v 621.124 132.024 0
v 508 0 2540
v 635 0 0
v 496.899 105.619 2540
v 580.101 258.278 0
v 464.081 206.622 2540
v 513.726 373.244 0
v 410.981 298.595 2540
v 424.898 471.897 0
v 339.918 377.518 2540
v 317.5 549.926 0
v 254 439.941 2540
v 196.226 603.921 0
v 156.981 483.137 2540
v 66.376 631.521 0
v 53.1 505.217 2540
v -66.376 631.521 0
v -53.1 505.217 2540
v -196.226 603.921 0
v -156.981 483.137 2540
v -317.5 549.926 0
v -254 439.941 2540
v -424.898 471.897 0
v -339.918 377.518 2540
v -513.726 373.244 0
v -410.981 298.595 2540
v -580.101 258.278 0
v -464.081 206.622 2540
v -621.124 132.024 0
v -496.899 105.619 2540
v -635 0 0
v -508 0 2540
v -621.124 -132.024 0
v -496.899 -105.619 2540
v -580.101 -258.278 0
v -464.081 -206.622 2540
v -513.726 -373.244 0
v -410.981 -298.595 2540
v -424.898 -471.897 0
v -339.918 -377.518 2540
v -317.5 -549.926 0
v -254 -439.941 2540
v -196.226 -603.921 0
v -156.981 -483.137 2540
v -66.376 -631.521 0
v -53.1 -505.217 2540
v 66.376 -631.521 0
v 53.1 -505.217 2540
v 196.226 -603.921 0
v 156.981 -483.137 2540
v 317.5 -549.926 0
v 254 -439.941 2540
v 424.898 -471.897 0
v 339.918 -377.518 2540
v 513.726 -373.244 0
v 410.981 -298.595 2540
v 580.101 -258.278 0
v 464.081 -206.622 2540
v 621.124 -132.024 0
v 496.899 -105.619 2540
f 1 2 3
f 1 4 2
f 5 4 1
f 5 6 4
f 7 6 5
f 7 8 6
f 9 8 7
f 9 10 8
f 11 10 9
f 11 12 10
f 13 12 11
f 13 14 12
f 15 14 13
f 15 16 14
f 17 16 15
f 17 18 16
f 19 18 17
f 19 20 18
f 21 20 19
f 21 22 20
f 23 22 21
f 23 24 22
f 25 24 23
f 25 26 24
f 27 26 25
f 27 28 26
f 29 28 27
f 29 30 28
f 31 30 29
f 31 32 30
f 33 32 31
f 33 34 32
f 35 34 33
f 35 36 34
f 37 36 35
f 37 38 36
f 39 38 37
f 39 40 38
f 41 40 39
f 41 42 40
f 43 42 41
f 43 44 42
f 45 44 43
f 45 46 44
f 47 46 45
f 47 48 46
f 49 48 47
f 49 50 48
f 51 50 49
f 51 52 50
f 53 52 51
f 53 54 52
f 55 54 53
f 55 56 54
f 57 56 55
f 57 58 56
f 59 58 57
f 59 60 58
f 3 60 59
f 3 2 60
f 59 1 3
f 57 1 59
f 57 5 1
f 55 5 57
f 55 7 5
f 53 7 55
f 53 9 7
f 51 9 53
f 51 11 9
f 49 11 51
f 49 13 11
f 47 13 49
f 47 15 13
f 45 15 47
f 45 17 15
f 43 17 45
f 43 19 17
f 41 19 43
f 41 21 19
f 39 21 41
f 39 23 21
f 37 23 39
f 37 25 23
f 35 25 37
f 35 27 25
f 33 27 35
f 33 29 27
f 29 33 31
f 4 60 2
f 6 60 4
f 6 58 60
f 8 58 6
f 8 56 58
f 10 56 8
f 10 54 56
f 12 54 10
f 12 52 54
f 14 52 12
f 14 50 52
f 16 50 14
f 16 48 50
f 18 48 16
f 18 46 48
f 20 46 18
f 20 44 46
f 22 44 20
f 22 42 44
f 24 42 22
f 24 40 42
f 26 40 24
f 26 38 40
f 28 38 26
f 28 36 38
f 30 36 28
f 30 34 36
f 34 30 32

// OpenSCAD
// Unit of length: Unit.MM
cylinder(h = 2540.0, d1 = 1270.0, d2 = 1016.0, center = false, $fa = 12.0, $fs = 50.8, $fn = 0);
